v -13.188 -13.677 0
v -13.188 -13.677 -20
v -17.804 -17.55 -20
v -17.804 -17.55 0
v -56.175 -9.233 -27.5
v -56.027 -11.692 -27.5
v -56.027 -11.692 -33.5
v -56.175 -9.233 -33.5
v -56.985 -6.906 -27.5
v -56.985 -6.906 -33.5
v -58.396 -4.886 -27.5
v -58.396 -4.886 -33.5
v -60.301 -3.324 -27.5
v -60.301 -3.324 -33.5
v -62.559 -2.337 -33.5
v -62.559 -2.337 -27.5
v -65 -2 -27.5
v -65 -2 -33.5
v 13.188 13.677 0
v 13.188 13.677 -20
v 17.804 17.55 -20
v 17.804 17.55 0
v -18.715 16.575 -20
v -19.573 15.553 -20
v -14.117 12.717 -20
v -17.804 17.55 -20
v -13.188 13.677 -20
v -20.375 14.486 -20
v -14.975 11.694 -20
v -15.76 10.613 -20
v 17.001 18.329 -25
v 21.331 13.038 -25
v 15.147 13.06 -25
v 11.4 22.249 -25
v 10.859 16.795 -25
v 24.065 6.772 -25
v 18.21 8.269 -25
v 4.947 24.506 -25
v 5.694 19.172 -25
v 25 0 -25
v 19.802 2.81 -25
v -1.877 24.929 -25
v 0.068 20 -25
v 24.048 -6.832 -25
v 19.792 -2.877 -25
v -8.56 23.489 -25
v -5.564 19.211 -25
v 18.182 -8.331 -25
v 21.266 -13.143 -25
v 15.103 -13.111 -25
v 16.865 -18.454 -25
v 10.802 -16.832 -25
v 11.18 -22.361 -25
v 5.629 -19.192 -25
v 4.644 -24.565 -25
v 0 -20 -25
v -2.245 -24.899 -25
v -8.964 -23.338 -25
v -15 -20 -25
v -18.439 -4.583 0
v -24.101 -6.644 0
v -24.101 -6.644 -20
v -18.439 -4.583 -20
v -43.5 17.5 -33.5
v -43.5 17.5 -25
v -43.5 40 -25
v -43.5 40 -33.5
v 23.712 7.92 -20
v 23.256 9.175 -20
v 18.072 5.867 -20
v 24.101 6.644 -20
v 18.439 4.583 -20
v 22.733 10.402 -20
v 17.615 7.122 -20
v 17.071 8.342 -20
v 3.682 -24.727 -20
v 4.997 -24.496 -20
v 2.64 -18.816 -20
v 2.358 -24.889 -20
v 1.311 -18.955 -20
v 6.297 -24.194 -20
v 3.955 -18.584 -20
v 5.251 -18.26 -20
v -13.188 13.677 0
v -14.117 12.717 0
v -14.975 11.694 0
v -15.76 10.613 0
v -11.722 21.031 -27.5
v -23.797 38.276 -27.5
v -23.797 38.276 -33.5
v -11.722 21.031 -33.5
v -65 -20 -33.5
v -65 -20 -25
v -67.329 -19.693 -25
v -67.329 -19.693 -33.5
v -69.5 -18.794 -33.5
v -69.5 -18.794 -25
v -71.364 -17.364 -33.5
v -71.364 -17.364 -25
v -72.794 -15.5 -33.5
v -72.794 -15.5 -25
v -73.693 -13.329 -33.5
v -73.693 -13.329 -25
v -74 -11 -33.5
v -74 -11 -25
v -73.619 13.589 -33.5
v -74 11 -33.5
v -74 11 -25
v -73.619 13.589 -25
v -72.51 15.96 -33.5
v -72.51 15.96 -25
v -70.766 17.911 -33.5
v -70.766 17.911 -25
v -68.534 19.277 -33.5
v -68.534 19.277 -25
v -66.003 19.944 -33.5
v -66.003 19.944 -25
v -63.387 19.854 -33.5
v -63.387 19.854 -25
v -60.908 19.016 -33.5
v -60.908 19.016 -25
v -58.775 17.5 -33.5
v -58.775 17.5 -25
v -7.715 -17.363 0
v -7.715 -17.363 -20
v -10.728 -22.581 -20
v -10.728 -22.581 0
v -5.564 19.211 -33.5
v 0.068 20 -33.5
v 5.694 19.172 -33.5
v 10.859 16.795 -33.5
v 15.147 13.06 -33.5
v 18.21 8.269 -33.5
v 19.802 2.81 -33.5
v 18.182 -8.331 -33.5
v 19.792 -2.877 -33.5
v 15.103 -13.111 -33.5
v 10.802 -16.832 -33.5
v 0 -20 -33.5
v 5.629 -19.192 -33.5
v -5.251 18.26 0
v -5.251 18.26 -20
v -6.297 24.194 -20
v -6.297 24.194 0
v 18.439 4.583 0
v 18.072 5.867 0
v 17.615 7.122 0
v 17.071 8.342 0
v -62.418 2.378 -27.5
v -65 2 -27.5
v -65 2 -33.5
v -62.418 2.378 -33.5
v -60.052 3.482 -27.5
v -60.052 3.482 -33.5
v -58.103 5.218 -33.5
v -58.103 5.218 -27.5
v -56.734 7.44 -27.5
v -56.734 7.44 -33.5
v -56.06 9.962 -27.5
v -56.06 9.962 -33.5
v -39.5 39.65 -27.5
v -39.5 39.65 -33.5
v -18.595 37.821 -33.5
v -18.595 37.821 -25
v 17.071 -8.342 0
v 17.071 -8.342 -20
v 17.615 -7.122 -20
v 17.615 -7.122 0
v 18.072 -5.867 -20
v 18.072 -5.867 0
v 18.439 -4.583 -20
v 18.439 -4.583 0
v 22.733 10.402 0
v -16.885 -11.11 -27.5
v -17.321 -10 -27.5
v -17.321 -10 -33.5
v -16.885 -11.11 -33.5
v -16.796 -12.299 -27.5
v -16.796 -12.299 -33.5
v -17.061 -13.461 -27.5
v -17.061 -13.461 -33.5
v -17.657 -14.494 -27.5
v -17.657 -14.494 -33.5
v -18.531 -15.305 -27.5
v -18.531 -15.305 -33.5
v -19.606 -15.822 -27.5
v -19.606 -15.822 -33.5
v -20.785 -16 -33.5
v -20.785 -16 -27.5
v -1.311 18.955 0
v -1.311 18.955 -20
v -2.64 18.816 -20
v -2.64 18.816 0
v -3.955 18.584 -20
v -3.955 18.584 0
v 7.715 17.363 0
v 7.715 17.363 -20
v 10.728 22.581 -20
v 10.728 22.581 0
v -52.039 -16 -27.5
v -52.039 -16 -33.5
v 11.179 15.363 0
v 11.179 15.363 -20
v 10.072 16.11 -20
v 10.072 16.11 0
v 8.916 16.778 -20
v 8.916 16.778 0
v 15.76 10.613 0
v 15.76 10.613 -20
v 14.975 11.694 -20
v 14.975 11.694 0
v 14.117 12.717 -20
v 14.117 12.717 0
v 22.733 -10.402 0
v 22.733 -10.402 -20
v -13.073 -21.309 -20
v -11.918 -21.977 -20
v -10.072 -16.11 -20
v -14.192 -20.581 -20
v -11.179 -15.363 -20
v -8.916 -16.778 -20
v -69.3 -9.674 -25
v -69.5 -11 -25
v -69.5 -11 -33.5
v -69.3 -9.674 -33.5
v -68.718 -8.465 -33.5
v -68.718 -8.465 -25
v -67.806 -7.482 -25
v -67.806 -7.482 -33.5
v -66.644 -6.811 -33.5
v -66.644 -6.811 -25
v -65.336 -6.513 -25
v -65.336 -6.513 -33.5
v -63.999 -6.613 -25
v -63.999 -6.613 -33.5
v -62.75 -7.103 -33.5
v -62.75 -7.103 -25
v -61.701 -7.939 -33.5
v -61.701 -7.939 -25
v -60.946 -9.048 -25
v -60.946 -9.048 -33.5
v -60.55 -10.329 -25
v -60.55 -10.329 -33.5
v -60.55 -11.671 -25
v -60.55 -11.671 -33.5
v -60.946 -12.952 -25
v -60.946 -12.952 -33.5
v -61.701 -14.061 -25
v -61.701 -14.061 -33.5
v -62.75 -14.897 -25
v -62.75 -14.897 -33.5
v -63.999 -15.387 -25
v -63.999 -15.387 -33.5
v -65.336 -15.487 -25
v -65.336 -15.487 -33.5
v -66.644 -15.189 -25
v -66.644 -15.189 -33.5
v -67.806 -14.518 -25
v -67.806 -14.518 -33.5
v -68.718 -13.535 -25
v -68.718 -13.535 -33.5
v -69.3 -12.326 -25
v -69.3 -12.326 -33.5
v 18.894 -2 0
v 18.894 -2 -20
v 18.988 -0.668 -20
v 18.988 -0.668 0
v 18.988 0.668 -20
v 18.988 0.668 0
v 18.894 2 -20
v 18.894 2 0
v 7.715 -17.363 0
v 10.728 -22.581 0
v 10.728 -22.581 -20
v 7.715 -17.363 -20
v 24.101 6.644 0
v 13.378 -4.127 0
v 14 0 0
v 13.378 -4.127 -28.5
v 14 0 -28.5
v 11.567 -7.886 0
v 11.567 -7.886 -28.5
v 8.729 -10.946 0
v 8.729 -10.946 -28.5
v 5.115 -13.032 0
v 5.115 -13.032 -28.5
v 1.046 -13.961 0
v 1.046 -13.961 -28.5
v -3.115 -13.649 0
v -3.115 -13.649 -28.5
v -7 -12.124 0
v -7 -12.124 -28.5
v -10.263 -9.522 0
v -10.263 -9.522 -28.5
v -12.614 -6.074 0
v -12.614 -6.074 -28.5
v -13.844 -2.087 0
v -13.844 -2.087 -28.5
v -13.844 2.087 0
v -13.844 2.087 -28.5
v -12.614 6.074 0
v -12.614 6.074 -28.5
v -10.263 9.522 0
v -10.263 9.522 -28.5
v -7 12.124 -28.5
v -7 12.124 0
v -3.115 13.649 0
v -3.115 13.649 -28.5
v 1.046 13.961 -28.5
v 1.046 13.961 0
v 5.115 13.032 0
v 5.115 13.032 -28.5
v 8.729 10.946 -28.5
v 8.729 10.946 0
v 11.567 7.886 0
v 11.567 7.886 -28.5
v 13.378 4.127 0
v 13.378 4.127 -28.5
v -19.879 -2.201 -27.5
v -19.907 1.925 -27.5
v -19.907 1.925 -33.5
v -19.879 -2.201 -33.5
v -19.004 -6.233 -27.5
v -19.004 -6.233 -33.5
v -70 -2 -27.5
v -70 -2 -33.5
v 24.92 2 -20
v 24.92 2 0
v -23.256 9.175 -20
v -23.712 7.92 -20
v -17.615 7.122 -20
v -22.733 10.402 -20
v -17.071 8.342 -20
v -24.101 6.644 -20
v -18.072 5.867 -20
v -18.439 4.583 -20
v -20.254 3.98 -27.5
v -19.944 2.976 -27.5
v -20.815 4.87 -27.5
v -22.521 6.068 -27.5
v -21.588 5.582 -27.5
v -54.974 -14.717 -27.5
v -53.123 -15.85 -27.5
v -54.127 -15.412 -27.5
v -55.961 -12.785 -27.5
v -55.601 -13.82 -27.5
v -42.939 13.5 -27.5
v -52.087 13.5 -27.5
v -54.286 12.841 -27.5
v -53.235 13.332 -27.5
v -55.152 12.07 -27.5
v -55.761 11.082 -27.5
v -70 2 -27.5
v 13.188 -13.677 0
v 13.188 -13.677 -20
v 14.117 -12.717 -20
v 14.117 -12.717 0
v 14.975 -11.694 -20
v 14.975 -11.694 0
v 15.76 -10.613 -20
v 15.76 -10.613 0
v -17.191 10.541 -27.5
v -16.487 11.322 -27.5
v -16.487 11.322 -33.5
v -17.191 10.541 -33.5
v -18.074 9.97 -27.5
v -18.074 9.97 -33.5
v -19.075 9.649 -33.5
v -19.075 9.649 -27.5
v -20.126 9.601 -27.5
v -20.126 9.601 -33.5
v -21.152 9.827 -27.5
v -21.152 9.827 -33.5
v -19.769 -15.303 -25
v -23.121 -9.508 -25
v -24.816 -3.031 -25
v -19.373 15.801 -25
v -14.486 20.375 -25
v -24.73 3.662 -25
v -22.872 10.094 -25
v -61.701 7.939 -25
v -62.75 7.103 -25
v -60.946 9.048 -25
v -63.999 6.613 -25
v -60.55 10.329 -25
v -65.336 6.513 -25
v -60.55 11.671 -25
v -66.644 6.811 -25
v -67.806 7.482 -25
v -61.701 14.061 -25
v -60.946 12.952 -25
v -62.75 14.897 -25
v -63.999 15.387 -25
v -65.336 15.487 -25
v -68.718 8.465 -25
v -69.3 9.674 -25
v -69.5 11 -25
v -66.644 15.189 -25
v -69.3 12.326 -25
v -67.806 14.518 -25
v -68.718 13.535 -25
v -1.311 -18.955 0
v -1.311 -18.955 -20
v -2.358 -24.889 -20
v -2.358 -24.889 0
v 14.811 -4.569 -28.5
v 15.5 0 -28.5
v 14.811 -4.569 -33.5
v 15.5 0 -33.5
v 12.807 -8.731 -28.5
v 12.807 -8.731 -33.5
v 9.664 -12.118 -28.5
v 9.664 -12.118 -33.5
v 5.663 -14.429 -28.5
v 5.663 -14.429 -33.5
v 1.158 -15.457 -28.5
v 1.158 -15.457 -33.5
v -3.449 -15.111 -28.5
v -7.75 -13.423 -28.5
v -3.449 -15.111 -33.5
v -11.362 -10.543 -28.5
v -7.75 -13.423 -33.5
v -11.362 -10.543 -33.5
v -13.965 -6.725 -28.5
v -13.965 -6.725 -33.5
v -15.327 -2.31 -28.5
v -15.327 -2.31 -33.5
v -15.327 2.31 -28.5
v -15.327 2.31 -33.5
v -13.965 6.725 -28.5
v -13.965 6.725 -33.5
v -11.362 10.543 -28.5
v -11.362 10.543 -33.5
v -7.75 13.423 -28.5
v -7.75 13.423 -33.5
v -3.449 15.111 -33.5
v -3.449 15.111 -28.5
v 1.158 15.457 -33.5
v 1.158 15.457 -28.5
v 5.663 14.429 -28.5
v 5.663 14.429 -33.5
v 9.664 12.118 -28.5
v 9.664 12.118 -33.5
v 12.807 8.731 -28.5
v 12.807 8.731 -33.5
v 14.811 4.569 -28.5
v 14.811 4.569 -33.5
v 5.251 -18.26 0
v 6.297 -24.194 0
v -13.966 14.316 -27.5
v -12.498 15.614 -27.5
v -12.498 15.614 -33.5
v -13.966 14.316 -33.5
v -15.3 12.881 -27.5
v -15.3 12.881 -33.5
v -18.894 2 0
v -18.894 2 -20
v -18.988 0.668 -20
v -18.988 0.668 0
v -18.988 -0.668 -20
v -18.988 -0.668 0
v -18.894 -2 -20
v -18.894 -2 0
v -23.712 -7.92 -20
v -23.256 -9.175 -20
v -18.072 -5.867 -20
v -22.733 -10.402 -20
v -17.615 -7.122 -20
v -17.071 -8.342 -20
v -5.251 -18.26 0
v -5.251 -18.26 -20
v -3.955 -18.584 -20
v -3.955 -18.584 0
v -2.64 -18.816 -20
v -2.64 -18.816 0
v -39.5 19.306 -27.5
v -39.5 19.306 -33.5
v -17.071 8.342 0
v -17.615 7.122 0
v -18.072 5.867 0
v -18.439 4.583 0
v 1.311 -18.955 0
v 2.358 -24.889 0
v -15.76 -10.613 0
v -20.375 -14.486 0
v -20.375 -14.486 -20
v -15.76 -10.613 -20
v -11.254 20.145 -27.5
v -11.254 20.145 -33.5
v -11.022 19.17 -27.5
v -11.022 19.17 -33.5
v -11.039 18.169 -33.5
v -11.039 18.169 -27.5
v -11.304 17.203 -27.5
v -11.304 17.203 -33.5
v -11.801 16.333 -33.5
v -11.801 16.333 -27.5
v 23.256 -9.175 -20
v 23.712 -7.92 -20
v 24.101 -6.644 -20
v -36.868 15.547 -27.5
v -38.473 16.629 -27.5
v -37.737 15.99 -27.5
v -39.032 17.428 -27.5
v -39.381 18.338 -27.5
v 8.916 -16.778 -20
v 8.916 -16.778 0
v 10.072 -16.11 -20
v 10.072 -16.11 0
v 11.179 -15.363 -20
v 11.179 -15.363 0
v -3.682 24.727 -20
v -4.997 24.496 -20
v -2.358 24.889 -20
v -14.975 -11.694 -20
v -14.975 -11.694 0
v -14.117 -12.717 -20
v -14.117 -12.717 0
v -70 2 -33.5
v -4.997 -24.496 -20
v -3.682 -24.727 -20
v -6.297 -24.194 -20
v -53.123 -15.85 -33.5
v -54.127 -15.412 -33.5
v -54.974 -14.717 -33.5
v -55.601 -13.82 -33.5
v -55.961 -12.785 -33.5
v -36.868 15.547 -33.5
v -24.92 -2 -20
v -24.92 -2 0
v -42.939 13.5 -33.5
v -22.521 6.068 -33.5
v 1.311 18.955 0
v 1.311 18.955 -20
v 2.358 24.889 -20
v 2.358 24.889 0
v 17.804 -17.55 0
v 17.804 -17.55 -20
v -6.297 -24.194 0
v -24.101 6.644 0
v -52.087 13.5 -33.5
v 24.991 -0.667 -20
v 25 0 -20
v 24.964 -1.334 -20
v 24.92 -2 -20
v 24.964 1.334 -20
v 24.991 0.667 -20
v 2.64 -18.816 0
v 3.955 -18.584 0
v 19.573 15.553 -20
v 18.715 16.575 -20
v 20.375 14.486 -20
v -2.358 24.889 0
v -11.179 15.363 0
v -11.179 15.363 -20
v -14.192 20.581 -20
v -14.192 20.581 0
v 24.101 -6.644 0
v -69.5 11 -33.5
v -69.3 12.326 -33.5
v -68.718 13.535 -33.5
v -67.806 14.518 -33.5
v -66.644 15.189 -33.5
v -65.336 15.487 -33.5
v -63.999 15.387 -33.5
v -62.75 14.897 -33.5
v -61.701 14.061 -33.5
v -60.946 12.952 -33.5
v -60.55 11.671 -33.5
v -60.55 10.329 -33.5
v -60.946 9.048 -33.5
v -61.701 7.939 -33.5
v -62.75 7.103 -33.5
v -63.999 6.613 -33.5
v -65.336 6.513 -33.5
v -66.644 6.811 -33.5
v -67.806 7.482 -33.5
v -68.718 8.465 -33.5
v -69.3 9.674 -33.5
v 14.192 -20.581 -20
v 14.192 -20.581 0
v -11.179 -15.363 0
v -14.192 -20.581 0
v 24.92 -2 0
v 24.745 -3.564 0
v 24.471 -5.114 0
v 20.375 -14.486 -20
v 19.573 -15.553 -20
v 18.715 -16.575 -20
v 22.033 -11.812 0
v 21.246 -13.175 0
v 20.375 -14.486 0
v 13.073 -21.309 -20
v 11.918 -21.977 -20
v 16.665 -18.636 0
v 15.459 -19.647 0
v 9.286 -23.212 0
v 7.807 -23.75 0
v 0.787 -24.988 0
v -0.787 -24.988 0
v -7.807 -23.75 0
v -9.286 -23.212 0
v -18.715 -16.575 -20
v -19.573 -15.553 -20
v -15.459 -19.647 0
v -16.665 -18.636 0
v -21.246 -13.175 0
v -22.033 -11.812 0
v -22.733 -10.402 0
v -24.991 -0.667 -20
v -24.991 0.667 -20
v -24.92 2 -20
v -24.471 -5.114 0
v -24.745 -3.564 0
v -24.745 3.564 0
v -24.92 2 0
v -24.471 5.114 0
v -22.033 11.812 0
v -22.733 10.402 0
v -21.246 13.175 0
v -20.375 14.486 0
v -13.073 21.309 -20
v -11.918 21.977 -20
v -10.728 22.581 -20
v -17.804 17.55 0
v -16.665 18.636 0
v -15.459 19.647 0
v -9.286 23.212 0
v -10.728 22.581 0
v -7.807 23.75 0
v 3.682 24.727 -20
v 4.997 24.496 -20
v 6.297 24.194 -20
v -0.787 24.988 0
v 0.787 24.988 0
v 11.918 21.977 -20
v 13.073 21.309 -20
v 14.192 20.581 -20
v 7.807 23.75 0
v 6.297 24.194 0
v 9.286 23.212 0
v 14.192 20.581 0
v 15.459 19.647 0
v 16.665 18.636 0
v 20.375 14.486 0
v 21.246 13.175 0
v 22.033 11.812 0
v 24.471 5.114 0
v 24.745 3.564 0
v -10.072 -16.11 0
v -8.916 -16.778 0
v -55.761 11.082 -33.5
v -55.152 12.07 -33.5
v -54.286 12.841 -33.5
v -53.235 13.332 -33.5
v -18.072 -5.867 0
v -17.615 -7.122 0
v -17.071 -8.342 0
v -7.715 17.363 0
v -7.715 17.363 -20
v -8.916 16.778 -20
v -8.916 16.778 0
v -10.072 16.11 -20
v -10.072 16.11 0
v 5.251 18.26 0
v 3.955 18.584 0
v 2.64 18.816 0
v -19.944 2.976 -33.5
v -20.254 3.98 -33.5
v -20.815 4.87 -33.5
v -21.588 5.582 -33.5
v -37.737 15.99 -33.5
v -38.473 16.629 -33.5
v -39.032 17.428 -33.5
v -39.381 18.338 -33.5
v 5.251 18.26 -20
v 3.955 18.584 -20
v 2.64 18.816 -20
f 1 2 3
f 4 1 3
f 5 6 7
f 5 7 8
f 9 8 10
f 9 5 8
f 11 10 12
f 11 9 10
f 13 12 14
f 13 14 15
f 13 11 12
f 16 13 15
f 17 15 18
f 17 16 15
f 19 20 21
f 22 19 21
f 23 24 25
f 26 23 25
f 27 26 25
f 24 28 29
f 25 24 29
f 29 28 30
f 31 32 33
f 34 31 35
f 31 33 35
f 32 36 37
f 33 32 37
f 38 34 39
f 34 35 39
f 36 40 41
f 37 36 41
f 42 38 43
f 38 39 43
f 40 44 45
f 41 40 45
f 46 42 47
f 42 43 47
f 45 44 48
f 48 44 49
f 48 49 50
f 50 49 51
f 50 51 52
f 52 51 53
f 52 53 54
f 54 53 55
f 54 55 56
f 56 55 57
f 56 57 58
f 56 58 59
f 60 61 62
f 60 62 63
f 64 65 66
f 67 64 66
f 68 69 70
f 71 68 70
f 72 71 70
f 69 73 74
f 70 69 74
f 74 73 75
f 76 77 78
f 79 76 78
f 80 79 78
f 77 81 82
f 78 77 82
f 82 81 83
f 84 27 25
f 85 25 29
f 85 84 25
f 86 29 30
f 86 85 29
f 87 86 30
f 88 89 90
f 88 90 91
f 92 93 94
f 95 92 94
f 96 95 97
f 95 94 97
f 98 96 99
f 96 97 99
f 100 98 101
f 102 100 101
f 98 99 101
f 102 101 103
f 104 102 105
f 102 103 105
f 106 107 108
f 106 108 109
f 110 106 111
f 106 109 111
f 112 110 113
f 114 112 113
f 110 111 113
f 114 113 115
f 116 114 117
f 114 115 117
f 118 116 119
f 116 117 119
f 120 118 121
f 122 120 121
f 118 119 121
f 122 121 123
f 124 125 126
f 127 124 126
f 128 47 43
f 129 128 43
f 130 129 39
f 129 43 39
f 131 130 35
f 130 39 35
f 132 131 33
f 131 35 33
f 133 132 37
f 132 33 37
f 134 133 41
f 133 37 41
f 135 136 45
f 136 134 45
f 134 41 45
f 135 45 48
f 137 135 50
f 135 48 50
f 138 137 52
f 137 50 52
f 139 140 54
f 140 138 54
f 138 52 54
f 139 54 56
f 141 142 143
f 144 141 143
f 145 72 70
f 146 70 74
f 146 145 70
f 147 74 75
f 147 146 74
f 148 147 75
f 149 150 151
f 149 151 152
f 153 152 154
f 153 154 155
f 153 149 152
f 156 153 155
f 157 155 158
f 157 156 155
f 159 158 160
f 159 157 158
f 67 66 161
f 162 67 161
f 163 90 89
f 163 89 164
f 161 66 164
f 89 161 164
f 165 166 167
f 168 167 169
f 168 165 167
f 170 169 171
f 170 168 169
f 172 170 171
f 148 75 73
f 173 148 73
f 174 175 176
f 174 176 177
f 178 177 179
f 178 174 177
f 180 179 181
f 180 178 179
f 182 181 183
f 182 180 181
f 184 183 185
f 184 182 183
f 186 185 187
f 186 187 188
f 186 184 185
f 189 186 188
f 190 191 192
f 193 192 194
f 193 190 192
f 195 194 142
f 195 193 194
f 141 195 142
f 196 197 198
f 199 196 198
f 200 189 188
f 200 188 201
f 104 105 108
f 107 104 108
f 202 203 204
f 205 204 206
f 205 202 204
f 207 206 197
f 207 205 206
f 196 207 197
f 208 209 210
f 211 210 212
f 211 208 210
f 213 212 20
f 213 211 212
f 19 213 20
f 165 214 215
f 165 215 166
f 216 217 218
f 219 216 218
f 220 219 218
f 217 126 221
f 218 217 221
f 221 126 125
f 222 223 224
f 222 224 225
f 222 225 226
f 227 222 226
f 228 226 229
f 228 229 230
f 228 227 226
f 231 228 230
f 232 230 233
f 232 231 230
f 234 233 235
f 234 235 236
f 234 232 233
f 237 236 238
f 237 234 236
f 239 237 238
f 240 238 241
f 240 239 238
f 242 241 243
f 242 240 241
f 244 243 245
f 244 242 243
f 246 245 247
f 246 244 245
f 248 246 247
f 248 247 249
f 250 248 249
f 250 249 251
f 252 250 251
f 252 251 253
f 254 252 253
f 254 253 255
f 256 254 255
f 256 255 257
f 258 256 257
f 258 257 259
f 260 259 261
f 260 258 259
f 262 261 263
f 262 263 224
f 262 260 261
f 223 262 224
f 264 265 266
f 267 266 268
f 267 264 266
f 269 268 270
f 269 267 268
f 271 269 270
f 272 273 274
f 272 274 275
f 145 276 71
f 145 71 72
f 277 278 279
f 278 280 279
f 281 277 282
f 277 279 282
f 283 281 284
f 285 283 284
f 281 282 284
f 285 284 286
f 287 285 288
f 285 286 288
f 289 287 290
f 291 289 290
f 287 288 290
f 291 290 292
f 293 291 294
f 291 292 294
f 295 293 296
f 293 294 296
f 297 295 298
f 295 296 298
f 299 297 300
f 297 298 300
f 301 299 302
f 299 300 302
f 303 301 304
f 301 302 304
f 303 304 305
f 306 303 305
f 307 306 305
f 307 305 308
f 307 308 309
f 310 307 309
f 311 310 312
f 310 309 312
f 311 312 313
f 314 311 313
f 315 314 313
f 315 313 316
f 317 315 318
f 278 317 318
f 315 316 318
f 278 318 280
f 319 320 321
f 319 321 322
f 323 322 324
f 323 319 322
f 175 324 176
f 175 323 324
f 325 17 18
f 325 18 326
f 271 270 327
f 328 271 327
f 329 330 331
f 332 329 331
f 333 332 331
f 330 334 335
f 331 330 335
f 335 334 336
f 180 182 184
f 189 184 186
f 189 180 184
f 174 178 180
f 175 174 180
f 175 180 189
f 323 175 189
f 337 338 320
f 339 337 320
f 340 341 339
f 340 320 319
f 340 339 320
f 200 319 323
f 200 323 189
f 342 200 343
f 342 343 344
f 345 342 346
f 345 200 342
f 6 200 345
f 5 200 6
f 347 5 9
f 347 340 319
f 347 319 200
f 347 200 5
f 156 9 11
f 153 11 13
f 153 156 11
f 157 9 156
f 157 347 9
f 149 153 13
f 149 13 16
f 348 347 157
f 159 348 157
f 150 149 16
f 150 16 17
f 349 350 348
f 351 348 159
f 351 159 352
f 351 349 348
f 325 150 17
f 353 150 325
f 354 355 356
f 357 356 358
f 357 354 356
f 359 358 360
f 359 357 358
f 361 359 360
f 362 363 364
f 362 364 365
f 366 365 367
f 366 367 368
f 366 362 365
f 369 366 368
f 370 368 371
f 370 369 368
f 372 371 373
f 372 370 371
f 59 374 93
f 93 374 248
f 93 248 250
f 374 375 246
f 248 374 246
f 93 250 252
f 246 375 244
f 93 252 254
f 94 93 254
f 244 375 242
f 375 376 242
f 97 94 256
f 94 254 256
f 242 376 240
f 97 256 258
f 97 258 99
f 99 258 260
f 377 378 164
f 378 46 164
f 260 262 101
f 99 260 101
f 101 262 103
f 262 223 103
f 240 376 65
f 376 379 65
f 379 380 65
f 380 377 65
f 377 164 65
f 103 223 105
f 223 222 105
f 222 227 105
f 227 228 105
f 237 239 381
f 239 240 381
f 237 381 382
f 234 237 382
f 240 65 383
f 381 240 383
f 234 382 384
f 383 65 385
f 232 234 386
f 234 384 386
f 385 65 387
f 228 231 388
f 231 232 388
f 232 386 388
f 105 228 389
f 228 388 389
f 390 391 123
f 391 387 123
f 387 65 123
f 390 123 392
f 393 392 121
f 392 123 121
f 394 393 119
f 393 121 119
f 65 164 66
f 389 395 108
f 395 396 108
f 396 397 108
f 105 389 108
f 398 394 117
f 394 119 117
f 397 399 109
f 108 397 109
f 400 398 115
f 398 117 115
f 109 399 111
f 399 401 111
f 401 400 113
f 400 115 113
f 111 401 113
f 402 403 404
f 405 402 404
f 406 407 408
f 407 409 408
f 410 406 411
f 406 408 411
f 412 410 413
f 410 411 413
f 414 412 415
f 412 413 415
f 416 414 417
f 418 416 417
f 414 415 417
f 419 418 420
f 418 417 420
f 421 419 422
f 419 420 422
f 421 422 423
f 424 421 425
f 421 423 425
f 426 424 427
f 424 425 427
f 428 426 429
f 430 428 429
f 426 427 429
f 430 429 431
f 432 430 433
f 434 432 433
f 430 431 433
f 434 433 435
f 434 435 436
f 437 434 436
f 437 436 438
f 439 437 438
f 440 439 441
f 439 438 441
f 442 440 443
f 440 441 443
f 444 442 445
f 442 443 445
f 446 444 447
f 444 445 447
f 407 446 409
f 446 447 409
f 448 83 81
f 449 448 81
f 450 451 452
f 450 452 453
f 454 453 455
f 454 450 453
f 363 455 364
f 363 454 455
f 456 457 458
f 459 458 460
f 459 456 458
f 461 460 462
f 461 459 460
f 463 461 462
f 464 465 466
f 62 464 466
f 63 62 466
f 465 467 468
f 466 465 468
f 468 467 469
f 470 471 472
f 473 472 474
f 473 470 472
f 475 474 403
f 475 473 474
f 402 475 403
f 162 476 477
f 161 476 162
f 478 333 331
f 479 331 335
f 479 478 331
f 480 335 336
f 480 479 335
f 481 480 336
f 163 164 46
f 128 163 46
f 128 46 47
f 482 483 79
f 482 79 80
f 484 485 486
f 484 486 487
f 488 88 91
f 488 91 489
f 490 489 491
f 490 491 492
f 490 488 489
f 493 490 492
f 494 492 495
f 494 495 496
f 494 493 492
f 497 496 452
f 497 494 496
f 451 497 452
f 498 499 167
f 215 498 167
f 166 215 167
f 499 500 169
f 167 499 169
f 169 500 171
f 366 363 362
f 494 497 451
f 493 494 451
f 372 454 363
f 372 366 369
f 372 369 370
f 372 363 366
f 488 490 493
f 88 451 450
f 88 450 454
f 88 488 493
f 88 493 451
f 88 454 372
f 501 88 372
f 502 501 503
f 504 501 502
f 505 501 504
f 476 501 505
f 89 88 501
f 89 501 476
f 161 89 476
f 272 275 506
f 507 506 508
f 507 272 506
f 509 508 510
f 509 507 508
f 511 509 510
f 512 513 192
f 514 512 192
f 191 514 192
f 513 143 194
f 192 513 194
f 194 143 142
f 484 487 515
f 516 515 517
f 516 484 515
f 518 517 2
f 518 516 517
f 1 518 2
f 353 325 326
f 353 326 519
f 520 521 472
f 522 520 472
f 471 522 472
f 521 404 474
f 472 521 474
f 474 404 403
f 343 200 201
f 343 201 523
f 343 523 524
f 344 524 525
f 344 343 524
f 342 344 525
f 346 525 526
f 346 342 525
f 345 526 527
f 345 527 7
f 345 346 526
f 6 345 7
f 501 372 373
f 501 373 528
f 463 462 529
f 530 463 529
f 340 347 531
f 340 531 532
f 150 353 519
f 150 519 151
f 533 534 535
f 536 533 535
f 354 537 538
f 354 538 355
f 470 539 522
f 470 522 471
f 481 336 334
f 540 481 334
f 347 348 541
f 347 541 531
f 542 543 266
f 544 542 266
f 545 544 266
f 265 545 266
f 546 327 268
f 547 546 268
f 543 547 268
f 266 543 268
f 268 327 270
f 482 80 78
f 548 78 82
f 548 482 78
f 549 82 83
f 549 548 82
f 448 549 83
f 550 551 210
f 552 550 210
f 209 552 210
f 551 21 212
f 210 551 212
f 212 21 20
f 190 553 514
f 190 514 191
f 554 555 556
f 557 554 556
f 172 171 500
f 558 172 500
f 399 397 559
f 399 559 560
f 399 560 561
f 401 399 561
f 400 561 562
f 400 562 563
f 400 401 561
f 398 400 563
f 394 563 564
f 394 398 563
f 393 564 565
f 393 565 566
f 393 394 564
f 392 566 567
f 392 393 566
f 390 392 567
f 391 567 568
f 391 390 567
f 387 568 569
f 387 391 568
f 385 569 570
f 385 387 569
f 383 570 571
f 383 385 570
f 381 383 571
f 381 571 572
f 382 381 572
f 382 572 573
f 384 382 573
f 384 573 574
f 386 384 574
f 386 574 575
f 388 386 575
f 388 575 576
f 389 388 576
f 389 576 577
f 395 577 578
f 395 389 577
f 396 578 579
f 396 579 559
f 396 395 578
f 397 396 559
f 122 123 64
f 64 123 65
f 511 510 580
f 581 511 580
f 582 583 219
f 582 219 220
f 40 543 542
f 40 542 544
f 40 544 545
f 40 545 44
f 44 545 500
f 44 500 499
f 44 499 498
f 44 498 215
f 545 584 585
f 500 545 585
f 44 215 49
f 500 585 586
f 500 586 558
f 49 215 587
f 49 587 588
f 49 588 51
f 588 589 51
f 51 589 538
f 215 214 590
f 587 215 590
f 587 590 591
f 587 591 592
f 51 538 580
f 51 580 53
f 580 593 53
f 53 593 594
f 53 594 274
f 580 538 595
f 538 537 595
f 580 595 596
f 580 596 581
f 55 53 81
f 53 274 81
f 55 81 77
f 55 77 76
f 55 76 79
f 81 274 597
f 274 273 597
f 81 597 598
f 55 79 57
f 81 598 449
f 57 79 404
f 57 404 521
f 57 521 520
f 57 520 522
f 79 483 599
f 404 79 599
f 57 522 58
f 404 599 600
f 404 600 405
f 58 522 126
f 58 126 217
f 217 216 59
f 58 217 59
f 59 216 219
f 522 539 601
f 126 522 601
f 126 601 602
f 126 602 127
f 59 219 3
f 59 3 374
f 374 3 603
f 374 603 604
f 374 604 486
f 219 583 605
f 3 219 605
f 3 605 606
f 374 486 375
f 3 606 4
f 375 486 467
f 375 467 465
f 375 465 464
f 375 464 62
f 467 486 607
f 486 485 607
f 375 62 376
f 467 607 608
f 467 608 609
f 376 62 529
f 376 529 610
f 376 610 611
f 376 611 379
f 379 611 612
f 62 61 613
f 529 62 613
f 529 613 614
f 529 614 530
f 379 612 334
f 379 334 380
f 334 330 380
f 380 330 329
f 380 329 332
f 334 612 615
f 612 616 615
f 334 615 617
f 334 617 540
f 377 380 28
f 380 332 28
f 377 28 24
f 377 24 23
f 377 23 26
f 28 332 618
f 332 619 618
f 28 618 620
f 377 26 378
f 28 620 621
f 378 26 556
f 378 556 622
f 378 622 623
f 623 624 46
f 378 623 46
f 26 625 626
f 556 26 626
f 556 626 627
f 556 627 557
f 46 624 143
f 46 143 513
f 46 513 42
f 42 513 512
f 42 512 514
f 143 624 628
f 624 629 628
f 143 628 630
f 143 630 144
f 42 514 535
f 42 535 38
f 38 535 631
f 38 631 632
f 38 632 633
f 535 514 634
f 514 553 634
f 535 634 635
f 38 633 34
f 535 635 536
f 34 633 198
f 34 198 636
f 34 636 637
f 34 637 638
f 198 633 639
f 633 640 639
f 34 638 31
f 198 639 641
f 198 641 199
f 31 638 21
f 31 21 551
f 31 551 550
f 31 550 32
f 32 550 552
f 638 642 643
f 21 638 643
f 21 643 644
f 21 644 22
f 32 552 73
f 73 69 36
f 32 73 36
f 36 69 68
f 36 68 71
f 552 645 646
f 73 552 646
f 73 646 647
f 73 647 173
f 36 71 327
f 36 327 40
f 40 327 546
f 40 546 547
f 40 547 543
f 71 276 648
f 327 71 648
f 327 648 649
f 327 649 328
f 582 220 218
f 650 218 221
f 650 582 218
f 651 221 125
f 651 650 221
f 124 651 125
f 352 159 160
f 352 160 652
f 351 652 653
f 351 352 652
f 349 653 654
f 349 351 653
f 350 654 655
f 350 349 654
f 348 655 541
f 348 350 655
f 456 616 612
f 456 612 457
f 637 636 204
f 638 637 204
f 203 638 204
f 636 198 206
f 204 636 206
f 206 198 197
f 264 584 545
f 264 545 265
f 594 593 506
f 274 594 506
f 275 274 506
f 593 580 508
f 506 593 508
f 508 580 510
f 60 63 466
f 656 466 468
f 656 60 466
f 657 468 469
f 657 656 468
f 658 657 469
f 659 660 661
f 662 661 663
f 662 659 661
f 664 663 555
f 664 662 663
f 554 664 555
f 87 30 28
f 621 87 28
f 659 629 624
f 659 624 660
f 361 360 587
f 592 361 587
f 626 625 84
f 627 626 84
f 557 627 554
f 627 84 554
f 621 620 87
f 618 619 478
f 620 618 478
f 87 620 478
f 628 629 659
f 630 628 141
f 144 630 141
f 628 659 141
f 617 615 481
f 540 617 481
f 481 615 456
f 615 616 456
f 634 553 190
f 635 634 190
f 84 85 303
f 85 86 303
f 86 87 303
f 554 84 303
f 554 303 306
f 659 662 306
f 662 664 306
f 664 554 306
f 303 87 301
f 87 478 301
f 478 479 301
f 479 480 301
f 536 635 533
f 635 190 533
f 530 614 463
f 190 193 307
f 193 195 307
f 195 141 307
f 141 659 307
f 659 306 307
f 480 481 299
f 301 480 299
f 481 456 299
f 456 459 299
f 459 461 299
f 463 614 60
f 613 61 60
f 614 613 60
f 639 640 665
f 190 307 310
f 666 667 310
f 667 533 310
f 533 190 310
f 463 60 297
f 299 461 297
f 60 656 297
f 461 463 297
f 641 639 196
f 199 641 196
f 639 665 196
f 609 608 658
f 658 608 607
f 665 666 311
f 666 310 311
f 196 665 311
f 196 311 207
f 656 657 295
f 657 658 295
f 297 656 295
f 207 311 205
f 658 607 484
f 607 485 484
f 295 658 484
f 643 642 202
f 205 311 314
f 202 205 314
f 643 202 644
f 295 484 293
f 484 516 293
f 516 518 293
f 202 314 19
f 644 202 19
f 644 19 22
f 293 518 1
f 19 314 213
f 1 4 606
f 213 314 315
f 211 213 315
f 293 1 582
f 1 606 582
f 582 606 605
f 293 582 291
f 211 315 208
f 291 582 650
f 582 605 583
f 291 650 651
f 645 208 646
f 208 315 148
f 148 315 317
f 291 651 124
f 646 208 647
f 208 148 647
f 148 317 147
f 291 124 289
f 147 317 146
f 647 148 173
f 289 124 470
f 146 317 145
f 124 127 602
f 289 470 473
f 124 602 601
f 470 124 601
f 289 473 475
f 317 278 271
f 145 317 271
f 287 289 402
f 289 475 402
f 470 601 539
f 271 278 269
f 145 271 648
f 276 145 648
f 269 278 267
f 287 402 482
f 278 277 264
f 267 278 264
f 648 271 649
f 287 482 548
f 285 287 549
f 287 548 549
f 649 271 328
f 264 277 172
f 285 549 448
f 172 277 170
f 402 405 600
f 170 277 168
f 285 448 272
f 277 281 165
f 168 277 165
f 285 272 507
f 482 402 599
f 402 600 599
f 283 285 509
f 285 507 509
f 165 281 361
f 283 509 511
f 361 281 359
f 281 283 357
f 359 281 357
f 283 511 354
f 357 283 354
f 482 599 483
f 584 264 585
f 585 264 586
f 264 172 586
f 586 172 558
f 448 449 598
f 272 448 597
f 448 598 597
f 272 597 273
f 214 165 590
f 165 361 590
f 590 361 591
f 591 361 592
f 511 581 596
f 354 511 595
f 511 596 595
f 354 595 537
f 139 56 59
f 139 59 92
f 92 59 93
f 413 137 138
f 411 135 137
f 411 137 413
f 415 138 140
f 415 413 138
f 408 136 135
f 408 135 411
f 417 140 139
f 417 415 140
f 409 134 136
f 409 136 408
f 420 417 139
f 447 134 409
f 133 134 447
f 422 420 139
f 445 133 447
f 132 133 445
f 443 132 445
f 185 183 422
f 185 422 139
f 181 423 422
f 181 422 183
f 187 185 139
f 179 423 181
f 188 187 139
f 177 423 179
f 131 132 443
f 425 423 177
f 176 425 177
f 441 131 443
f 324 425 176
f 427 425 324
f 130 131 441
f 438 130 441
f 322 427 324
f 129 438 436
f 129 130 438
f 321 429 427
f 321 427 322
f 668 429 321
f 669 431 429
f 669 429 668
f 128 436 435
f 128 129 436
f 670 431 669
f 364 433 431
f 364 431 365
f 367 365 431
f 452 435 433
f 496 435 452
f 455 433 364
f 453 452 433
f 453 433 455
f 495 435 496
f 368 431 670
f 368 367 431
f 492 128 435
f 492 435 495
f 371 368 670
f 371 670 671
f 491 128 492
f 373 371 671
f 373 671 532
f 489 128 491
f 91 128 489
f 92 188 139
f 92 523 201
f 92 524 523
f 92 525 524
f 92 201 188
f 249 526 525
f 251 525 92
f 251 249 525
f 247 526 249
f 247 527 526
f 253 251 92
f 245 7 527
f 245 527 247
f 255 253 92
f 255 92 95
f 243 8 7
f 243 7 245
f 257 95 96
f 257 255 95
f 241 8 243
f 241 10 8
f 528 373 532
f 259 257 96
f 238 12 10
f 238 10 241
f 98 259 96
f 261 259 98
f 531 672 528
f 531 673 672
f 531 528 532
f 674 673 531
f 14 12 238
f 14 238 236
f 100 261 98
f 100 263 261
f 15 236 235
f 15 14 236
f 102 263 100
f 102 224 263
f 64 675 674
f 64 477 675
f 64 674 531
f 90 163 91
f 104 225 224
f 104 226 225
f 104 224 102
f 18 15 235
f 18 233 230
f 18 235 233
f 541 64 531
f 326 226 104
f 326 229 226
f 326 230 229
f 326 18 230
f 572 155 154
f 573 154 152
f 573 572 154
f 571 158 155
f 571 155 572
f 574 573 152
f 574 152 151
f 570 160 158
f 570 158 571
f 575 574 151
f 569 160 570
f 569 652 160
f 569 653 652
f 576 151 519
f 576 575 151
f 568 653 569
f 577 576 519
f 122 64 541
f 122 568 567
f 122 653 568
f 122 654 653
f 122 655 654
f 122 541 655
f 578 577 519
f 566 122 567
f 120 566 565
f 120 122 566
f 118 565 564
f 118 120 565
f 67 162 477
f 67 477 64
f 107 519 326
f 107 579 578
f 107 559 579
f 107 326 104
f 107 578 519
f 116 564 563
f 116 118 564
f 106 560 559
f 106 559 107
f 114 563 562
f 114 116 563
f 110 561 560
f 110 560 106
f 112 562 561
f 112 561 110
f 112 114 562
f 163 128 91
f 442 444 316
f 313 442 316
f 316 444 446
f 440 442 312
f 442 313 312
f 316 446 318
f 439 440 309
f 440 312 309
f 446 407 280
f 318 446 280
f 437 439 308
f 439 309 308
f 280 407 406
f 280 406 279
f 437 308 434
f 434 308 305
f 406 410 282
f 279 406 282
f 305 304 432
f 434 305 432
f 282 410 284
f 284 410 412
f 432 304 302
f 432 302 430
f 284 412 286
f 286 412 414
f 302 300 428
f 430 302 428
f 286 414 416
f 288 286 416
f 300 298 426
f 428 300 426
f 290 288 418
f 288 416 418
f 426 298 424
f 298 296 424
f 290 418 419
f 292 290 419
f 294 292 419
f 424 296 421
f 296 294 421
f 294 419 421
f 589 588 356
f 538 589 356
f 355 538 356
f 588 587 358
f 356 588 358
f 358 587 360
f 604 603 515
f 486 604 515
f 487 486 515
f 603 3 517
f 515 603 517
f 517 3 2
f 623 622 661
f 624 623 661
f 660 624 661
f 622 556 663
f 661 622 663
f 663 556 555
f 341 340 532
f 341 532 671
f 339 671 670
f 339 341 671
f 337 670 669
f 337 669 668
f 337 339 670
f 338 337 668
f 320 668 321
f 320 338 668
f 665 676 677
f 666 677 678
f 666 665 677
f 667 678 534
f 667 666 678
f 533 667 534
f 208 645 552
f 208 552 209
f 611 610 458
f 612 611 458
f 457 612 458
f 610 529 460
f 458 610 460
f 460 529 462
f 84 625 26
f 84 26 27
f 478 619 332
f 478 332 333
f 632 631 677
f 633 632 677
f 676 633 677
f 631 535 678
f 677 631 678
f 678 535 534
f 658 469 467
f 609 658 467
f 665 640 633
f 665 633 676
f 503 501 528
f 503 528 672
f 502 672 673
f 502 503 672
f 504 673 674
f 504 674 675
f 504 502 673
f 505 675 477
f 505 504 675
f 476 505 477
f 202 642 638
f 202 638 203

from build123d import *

# Parameters (mm, degrees)
CUT_EXTRUDE1_DEPTH  = 20
CIRPATTERN1_COUNT   = 18
BOSS_EXTRUDE1_START = -8.5
SKETCH3_R           = 4.5
BOSS_EXTRUDE1_DEPTH = 8.5
CUT_EXTRUDE2_START  = -6
CUT_EXTRUDE2_DEPTH  = 6


with BuildPart() as part:
    # Sketch1 → Revolve2 (revolve)
    with BuildSketch(Plane(origin=(0, 0, 0), x_dir=(1, 0, 0), z_dir=(0, 1, 0)), mode=Mode.PRIVATE) as revolve2_sk:
        Polygon((-25, 0), (-14, 0), (-14, 28.5), (-15.5, 28.5), (-15.5, 33.5), (-20, 33.5), (-20, 25), (-25, 25), align=None)
    revolve(revolve2_sk.sketch.rotate(Axis((0, 0, 0), (0, 0, -1)), 180), axis=Axis((0, 0, 0), (0, 0, -1)))

    # Sketch2 → Cut-Extrude1 (cut)
    with BuildSketch(Plane.XY):
        with BuildLine():
            Line((18.894443628, 2), (24.919871589, 2))
            ThreePointArc((24.919871589, 2), (25, 0), (24.919871589, -2))
            Line((24.919871589, -2), (18.894443628, -2))
            ThreePointArc((18.894443628, -2), (19, 0), (18.894443628, 2))
        make_face()
    cut_extrude1 = extrude(amount=-CUT_EXTRUDE1_DEPTH, mode=Mode.SUBTRACT)

    # CirPattern1: Cut-Extrude1 ×18 about axis
    cirpattern1_axis = Axis((0, 0, 0), (0, 0, 1))
    for i in range(1, CIRPATTERN1_COUNT):
        add(cut_extrude1.rotate(cirpattern1_axis, i * 360 / CIRPATTERN1_COUNT), mode=Mode.SUBTRACT)

    # Sketch3 → Boss-Extrude1 (add)
    with BuildSketch(Plane(origin=(0, 0, -33.5), x_dir=(-1, 0, 0), z_dir=(0, 0, -1)).offset(BOSS_EXTRUDE1_START)):
        with BuildLine():
            Line((0, -20), (65, -20))
            ThreePointArc((65, -20), (71.363961031, -17.363961031), (74, -11))
            Line((74, -11), (74, 11))
            ThreePointArc((74, 11), (68.53379766, 19.277214151), (58.775050201, 17.5))
            Line((58.775050201, 17.5), (43.5, 17.5))
            Line((43.5, 17.5), (43.5, 40))
            Line((43.5, 40), (18.595132548, 37.821106431))
            Line((18.595132548, 37.821106431), (5.563850354, 19.210506741))
            ThreePointArc((5.563850354, 19.210506741), (19.801643048, -2.809792268), (0, -20))
        make_face()
        with Locations((65, 11)):
            Circle(SKETCH3_R, mode=Mode.SUBTRACT)
        with Locations((65, -11)):
            Circle(SKETCH3_R, mode=Mode.SUBTRACT)
    extrude(amount=BOSS_EXTRUDE1_DEPTH)

    # Sketch6 → Cut-Extrude2 (cut)
    with BuildSketch(Plane(origin=(0, 0, -33.5), x_dir=(-1, 0, 0), z_dir=(0, 0, -1)).offset(CUT_EXTRUDE2_START)):
        with BuildLine():
            Line((20.784609691, -16), (52.038518603, -16))
            ThreePointArc((52.038518603, -16), (54.973716146, -14.717464882), (56.026666725, -11.692307692))
            ThreePointArc((56.026666725, -11.692307692), (58.395805529, -4.885704016), (65, -2))
            Line((65, -2), (70, -2))
            Line((70, -2), (70, 2))
            Line((70, 2), (65, 2))
            ThreePointArc((65, 2), (59.014440454, 4.278908056), (56.06011199, 9.961538462))
            ThreePointArc((56.06011199, 9.961538462), (54.747077117, 12.487151975), (52.08682843, 13.5))
            Line((52.08682843, 13.5), (42.938553963, 13.5))
            Line((42.938553963, 13.5), (22.520523512, 6.068444673))
            ThreePointArc((22.520523512, 6.068444673), (20.505273991, 4.44346834), (19.907170071, 1.924728492))
            ThreePointArc((19.907170071, 1.924728492), (19.545454521, -4.239717862), (17.320508076, -10))
            ThreePointArc((17.320508076, -10), (17.320508076, -14), (20.784609691, -16))
        make_face()
        with BuildLine():
            Line((23.79689183, 38.276201399), (11.721526755, 21.030792837))
            ThreePointArc((11.721526755, 21.030792837), (11.038650101, 18.16861398), (12.498445777, 15.613739243))
            ThreePointArc((12.498445777, 15.613739243), (14.650735805, 13.614548849), (16.486968638, 11.3216547))
            ThreePointArc((16.486968638, 11.3216547), (18.564157588, 9.776641825), (21.152442938, 9.827215157))
            Line((21.152442938, 9.827215157), (36.868080573, 15.547239468))
            ThreePointArc((36.868080573, 15.547239468), (38.776608177, 17.011704206), (39.5, 19.306009951))
            Line((39.5, 19.306009951), (39.5, 39.650045346))
            Line((39.5, 39.650045346), (23.79689183, 38.276201399))
        make_face()
    extrude(amount=CUT_EXTRUDE2_DEPTH, mode=Mode.SUBTRACT)


solid = part.part
